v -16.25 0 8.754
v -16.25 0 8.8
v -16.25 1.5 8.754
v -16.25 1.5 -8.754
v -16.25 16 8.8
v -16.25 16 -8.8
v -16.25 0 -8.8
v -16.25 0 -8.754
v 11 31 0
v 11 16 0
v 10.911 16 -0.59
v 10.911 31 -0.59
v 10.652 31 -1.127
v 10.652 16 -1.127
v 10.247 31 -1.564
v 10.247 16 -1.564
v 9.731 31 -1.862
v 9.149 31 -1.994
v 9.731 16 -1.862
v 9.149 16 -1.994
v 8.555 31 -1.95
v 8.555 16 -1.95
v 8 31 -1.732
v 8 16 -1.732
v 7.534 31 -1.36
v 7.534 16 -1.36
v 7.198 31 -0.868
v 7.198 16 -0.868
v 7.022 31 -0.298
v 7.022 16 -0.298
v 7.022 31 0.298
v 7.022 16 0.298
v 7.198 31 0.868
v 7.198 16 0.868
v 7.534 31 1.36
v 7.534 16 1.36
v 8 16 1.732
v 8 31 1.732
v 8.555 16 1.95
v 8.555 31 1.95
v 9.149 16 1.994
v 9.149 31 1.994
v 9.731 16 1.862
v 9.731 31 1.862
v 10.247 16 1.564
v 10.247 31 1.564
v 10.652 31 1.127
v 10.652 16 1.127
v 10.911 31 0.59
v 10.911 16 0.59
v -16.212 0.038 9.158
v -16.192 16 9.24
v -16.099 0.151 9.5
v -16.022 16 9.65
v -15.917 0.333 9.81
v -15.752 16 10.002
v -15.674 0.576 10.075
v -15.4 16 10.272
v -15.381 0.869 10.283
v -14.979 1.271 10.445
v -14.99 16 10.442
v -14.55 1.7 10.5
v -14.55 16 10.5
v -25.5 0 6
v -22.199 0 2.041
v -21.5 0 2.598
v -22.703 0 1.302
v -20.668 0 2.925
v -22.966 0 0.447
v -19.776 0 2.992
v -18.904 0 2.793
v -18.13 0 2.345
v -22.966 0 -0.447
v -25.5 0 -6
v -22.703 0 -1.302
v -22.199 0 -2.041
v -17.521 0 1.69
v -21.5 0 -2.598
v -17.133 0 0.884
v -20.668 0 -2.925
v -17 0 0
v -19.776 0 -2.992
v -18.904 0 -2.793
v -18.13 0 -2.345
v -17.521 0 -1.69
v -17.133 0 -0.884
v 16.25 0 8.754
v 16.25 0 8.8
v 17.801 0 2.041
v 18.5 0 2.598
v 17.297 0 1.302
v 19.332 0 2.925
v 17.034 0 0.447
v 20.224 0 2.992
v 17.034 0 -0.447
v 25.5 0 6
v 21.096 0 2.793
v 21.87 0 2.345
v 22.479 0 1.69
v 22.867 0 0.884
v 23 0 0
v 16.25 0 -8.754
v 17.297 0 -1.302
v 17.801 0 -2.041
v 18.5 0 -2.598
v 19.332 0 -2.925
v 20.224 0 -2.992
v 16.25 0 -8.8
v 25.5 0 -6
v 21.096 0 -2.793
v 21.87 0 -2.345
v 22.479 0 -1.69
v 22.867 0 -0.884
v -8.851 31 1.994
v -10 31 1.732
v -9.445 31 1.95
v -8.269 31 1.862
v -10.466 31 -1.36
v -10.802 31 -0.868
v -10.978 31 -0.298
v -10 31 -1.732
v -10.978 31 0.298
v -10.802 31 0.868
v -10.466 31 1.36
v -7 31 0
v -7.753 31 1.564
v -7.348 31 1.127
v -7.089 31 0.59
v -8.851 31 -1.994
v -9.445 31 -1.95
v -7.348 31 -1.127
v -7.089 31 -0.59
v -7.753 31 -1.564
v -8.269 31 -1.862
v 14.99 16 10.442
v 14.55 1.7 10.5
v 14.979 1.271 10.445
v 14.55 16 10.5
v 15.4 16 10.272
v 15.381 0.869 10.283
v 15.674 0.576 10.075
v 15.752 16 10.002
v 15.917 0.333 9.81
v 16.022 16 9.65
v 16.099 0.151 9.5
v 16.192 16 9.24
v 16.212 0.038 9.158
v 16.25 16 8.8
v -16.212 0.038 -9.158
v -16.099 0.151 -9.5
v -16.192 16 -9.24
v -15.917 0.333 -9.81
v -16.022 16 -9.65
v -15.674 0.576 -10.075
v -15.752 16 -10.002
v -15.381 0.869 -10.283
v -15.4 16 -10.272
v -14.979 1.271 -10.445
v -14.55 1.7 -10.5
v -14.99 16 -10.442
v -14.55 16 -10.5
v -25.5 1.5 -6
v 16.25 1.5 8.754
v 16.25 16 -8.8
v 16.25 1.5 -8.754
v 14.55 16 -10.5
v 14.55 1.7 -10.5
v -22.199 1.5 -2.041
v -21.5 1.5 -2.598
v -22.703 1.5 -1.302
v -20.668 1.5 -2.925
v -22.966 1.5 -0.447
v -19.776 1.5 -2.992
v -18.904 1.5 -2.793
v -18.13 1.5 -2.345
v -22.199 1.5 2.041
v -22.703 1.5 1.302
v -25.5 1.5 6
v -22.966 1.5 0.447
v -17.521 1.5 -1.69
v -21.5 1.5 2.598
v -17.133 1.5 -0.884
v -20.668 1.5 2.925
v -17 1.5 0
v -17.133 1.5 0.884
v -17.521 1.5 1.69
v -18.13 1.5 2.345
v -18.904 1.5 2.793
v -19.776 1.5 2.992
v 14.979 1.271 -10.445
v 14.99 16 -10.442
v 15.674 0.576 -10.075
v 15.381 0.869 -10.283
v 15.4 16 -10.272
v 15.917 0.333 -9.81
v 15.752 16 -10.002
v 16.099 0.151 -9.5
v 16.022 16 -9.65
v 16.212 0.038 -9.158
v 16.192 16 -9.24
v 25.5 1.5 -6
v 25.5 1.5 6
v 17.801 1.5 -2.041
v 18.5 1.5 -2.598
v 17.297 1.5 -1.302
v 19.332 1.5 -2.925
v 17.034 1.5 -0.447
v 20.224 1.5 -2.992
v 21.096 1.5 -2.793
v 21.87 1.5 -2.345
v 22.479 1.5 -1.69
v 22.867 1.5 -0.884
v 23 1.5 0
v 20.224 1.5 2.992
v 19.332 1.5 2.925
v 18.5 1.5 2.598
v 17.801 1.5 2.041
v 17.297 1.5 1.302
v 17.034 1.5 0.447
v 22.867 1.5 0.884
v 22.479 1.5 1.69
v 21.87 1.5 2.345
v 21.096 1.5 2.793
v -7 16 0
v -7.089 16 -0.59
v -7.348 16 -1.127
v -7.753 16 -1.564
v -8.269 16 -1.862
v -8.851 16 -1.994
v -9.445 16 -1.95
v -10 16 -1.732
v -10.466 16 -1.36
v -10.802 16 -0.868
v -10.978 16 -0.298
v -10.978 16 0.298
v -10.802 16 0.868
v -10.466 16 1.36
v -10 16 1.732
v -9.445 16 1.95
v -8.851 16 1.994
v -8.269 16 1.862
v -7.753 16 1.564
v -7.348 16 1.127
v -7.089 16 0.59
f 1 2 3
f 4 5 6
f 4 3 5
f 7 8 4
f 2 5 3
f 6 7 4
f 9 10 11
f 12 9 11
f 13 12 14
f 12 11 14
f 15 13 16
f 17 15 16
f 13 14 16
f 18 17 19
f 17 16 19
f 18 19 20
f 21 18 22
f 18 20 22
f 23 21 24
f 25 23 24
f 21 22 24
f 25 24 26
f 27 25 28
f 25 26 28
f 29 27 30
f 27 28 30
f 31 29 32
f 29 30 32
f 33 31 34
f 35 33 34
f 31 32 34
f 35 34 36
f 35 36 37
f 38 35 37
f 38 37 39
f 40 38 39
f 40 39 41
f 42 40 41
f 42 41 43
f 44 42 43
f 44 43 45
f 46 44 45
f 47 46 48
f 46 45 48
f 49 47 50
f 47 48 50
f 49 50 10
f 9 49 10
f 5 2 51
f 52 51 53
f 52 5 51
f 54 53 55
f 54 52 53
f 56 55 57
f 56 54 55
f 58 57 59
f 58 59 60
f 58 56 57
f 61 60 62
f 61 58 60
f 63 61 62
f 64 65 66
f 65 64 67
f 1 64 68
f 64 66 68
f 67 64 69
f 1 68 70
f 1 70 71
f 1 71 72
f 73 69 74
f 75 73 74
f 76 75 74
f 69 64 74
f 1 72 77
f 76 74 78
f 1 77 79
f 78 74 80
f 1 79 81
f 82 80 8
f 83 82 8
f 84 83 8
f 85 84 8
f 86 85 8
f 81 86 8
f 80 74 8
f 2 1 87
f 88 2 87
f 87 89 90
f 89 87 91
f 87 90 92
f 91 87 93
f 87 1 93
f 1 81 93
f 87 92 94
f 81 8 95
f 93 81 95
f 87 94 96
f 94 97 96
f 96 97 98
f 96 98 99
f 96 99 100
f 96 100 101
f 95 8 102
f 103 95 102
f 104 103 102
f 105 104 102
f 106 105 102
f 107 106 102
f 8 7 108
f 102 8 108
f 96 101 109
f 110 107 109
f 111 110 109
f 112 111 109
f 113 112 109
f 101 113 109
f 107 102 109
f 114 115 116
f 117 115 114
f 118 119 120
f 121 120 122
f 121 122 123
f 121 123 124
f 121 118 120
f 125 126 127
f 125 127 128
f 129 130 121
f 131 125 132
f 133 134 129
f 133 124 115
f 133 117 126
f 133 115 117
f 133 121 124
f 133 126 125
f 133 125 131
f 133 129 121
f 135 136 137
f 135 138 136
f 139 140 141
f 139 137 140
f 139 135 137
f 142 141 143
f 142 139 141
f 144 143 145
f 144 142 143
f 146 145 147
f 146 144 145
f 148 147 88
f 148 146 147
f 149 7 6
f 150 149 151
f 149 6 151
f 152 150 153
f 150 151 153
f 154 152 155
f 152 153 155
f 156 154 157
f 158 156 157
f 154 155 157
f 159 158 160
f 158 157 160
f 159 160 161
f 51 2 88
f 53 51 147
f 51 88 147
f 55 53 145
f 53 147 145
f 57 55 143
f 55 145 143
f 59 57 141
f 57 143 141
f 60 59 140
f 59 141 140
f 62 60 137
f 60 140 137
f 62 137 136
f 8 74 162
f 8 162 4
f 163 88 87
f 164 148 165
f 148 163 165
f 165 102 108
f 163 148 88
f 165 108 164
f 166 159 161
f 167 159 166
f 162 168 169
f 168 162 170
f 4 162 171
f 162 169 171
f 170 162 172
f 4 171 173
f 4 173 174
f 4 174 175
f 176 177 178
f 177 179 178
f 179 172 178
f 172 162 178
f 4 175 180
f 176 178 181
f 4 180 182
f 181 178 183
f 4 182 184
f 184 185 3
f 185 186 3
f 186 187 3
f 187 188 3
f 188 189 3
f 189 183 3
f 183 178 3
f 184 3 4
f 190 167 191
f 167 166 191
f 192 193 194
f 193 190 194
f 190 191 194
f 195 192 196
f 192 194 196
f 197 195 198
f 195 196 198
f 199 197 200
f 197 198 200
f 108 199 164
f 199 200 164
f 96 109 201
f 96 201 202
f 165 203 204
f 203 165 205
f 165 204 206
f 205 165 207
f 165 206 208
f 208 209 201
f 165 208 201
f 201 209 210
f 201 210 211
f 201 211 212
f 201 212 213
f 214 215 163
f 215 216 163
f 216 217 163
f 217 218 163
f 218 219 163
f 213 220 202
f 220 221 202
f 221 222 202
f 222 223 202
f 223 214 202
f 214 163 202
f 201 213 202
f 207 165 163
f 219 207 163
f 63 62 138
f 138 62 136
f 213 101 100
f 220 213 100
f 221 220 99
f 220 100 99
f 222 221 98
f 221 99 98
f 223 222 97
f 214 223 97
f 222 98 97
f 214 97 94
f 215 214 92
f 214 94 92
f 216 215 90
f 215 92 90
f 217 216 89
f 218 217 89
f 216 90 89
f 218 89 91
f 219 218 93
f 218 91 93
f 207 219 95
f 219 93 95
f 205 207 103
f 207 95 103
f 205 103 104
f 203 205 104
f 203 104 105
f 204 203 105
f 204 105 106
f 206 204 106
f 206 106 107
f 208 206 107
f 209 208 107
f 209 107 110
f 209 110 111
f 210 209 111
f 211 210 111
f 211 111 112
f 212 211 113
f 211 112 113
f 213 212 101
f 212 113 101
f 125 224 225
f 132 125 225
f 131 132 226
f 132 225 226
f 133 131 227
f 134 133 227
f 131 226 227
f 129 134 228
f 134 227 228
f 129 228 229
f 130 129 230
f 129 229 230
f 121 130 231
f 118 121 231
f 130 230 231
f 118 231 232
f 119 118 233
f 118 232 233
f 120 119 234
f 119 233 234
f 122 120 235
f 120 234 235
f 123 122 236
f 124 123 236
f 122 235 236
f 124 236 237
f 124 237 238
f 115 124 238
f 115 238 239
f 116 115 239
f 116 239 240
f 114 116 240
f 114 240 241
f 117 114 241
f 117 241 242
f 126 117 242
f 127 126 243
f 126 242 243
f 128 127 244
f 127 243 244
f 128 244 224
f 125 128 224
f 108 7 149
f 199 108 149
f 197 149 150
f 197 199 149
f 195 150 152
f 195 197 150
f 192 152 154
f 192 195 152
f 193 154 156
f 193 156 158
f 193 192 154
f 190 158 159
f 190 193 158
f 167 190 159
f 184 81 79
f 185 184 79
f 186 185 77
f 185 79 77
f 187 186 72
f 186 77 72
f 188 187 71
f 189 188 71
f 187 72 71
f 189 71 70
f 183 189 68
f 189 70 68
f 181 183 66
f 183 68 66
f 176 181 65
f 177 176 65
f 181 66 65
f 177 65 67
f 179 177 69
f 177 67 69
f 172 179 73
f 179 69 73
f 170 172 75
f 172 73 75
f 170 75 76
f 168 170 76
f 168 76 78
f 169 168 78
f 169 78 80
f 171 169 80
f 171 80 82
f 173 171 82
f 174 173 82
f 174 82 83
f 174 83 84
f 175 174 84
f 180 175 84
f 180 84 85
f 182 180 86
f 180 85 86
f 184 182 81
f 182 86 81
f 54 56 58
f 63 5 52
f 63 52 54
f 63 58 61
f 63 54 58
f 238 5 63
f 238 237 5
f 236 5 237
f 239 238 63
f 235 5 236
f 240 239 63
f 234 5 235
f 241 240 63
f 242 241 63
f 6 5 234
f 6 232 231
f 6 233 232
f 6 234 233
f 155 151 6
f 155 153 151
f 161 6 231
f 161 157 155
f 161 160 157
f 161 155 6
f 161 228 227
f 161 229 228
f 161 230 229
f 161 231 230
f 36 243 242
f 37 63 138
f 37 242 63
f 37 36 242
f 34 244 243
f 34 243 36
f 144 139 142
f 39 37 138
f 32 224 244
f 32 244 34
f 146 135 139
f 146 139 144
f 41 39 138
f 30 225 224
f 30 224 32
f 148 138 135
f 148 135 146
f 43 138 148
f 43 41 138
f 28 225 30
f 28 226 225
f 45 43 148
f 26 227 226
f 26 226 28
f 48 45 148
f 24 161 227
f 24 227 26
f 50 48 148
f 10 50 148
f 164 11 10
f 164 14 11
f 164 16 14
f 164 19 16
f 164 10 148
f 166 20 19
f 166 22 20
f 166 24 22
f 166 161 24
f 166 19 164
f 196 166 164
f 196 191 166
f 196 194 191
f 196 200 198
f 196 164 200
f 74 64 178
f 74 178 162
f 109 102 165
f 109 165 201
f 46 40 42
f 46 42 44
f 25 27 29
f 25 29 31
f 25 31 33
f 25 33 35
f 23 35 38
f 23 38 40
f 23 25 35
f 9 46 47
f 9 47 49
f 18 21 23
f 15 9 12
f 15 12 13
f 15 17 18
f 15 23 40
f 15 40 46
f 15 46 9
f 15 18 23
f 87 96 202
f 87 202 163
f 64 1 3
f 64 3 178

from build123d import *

# Parameters (mm, degrees)
CROQUIS1_W              = 32.5
CROQUIS1_H              = 21
SALIENTE_EXTRUIR1_DEPTH = 16
CROQUIS2_R              = 2
SALIENTE_EXTRUIR2_DEPTH = 15
CROQUIS3_R              = 3
SALIENTE_EXTRUIR3_DEPTH = 1.5
REDONDEO1_R             = 1.7


with BuildPart() as part:
    # Croquis1 → Saliente-Extruir1 (new body)
    with BuildSketch(Plane(origin=(0, 0, 0), x_dir=(1, 0, 0), z_dir=(0, 1, 0))):
        Rectangle(CROQUIS1_W, CROQUIS1_H)
    extrude(amount=SALIENTE_EXTRUIR1_DEPTH)

    # Croquis2 → Saliente-Extruir2 (add)
    with BuildSketch(Plane(origin=(0, 16, 0), x_dir=(1, 0, 0), z_dir=(0, 1, 0))):
        with Locations((-9, 0)):
            Circle(CROQUIS2_R)
        with Locations((9, 0)):
            Circle(CROQUIS2_R)
    extrude(amount=SALIENTE_EXTRUIR2_DEPTH)

    # Croquis3 → Saliente-Extruir3 (add)
    with BuildSketch(Plane.XZ):
        Polygon((-16.25, 8.754302239), (-25.5, 6), (-25.5, -6), (-16.25, -8.754302239), align=None)
        with Locations((-20, 0)):
            Circle(CROQUIS3_R, mode=Mode.SUBTRACT)
        Polygon((16.25, -8.754302239), (25.5, -6), (25.5, 6), (16.25, 8.754302239), align=None)
        with Locations((20, 0)):
            Circle(CROQUIS3_R, mode=Mode.SUBTRACT)
    extrude(amount=-SALIENTE_EXTRUIR3_DEPTH)

    # Redondeo1
    redondeo1_edges = [part.edges().sort_by_distance(p)[0] for p in [
        (0, 0, 10.5),
        (0, 0, -10.5),
        (16.25, 8, 10.5),
        (-16.25, 8, 10.5),
        (-16.25, 8, -10.5),
        (16.25, 8, -10.5),
    ]]
    fillet(redondeo1_edges, radius=REDONDEO1_R)


solid = part.part
